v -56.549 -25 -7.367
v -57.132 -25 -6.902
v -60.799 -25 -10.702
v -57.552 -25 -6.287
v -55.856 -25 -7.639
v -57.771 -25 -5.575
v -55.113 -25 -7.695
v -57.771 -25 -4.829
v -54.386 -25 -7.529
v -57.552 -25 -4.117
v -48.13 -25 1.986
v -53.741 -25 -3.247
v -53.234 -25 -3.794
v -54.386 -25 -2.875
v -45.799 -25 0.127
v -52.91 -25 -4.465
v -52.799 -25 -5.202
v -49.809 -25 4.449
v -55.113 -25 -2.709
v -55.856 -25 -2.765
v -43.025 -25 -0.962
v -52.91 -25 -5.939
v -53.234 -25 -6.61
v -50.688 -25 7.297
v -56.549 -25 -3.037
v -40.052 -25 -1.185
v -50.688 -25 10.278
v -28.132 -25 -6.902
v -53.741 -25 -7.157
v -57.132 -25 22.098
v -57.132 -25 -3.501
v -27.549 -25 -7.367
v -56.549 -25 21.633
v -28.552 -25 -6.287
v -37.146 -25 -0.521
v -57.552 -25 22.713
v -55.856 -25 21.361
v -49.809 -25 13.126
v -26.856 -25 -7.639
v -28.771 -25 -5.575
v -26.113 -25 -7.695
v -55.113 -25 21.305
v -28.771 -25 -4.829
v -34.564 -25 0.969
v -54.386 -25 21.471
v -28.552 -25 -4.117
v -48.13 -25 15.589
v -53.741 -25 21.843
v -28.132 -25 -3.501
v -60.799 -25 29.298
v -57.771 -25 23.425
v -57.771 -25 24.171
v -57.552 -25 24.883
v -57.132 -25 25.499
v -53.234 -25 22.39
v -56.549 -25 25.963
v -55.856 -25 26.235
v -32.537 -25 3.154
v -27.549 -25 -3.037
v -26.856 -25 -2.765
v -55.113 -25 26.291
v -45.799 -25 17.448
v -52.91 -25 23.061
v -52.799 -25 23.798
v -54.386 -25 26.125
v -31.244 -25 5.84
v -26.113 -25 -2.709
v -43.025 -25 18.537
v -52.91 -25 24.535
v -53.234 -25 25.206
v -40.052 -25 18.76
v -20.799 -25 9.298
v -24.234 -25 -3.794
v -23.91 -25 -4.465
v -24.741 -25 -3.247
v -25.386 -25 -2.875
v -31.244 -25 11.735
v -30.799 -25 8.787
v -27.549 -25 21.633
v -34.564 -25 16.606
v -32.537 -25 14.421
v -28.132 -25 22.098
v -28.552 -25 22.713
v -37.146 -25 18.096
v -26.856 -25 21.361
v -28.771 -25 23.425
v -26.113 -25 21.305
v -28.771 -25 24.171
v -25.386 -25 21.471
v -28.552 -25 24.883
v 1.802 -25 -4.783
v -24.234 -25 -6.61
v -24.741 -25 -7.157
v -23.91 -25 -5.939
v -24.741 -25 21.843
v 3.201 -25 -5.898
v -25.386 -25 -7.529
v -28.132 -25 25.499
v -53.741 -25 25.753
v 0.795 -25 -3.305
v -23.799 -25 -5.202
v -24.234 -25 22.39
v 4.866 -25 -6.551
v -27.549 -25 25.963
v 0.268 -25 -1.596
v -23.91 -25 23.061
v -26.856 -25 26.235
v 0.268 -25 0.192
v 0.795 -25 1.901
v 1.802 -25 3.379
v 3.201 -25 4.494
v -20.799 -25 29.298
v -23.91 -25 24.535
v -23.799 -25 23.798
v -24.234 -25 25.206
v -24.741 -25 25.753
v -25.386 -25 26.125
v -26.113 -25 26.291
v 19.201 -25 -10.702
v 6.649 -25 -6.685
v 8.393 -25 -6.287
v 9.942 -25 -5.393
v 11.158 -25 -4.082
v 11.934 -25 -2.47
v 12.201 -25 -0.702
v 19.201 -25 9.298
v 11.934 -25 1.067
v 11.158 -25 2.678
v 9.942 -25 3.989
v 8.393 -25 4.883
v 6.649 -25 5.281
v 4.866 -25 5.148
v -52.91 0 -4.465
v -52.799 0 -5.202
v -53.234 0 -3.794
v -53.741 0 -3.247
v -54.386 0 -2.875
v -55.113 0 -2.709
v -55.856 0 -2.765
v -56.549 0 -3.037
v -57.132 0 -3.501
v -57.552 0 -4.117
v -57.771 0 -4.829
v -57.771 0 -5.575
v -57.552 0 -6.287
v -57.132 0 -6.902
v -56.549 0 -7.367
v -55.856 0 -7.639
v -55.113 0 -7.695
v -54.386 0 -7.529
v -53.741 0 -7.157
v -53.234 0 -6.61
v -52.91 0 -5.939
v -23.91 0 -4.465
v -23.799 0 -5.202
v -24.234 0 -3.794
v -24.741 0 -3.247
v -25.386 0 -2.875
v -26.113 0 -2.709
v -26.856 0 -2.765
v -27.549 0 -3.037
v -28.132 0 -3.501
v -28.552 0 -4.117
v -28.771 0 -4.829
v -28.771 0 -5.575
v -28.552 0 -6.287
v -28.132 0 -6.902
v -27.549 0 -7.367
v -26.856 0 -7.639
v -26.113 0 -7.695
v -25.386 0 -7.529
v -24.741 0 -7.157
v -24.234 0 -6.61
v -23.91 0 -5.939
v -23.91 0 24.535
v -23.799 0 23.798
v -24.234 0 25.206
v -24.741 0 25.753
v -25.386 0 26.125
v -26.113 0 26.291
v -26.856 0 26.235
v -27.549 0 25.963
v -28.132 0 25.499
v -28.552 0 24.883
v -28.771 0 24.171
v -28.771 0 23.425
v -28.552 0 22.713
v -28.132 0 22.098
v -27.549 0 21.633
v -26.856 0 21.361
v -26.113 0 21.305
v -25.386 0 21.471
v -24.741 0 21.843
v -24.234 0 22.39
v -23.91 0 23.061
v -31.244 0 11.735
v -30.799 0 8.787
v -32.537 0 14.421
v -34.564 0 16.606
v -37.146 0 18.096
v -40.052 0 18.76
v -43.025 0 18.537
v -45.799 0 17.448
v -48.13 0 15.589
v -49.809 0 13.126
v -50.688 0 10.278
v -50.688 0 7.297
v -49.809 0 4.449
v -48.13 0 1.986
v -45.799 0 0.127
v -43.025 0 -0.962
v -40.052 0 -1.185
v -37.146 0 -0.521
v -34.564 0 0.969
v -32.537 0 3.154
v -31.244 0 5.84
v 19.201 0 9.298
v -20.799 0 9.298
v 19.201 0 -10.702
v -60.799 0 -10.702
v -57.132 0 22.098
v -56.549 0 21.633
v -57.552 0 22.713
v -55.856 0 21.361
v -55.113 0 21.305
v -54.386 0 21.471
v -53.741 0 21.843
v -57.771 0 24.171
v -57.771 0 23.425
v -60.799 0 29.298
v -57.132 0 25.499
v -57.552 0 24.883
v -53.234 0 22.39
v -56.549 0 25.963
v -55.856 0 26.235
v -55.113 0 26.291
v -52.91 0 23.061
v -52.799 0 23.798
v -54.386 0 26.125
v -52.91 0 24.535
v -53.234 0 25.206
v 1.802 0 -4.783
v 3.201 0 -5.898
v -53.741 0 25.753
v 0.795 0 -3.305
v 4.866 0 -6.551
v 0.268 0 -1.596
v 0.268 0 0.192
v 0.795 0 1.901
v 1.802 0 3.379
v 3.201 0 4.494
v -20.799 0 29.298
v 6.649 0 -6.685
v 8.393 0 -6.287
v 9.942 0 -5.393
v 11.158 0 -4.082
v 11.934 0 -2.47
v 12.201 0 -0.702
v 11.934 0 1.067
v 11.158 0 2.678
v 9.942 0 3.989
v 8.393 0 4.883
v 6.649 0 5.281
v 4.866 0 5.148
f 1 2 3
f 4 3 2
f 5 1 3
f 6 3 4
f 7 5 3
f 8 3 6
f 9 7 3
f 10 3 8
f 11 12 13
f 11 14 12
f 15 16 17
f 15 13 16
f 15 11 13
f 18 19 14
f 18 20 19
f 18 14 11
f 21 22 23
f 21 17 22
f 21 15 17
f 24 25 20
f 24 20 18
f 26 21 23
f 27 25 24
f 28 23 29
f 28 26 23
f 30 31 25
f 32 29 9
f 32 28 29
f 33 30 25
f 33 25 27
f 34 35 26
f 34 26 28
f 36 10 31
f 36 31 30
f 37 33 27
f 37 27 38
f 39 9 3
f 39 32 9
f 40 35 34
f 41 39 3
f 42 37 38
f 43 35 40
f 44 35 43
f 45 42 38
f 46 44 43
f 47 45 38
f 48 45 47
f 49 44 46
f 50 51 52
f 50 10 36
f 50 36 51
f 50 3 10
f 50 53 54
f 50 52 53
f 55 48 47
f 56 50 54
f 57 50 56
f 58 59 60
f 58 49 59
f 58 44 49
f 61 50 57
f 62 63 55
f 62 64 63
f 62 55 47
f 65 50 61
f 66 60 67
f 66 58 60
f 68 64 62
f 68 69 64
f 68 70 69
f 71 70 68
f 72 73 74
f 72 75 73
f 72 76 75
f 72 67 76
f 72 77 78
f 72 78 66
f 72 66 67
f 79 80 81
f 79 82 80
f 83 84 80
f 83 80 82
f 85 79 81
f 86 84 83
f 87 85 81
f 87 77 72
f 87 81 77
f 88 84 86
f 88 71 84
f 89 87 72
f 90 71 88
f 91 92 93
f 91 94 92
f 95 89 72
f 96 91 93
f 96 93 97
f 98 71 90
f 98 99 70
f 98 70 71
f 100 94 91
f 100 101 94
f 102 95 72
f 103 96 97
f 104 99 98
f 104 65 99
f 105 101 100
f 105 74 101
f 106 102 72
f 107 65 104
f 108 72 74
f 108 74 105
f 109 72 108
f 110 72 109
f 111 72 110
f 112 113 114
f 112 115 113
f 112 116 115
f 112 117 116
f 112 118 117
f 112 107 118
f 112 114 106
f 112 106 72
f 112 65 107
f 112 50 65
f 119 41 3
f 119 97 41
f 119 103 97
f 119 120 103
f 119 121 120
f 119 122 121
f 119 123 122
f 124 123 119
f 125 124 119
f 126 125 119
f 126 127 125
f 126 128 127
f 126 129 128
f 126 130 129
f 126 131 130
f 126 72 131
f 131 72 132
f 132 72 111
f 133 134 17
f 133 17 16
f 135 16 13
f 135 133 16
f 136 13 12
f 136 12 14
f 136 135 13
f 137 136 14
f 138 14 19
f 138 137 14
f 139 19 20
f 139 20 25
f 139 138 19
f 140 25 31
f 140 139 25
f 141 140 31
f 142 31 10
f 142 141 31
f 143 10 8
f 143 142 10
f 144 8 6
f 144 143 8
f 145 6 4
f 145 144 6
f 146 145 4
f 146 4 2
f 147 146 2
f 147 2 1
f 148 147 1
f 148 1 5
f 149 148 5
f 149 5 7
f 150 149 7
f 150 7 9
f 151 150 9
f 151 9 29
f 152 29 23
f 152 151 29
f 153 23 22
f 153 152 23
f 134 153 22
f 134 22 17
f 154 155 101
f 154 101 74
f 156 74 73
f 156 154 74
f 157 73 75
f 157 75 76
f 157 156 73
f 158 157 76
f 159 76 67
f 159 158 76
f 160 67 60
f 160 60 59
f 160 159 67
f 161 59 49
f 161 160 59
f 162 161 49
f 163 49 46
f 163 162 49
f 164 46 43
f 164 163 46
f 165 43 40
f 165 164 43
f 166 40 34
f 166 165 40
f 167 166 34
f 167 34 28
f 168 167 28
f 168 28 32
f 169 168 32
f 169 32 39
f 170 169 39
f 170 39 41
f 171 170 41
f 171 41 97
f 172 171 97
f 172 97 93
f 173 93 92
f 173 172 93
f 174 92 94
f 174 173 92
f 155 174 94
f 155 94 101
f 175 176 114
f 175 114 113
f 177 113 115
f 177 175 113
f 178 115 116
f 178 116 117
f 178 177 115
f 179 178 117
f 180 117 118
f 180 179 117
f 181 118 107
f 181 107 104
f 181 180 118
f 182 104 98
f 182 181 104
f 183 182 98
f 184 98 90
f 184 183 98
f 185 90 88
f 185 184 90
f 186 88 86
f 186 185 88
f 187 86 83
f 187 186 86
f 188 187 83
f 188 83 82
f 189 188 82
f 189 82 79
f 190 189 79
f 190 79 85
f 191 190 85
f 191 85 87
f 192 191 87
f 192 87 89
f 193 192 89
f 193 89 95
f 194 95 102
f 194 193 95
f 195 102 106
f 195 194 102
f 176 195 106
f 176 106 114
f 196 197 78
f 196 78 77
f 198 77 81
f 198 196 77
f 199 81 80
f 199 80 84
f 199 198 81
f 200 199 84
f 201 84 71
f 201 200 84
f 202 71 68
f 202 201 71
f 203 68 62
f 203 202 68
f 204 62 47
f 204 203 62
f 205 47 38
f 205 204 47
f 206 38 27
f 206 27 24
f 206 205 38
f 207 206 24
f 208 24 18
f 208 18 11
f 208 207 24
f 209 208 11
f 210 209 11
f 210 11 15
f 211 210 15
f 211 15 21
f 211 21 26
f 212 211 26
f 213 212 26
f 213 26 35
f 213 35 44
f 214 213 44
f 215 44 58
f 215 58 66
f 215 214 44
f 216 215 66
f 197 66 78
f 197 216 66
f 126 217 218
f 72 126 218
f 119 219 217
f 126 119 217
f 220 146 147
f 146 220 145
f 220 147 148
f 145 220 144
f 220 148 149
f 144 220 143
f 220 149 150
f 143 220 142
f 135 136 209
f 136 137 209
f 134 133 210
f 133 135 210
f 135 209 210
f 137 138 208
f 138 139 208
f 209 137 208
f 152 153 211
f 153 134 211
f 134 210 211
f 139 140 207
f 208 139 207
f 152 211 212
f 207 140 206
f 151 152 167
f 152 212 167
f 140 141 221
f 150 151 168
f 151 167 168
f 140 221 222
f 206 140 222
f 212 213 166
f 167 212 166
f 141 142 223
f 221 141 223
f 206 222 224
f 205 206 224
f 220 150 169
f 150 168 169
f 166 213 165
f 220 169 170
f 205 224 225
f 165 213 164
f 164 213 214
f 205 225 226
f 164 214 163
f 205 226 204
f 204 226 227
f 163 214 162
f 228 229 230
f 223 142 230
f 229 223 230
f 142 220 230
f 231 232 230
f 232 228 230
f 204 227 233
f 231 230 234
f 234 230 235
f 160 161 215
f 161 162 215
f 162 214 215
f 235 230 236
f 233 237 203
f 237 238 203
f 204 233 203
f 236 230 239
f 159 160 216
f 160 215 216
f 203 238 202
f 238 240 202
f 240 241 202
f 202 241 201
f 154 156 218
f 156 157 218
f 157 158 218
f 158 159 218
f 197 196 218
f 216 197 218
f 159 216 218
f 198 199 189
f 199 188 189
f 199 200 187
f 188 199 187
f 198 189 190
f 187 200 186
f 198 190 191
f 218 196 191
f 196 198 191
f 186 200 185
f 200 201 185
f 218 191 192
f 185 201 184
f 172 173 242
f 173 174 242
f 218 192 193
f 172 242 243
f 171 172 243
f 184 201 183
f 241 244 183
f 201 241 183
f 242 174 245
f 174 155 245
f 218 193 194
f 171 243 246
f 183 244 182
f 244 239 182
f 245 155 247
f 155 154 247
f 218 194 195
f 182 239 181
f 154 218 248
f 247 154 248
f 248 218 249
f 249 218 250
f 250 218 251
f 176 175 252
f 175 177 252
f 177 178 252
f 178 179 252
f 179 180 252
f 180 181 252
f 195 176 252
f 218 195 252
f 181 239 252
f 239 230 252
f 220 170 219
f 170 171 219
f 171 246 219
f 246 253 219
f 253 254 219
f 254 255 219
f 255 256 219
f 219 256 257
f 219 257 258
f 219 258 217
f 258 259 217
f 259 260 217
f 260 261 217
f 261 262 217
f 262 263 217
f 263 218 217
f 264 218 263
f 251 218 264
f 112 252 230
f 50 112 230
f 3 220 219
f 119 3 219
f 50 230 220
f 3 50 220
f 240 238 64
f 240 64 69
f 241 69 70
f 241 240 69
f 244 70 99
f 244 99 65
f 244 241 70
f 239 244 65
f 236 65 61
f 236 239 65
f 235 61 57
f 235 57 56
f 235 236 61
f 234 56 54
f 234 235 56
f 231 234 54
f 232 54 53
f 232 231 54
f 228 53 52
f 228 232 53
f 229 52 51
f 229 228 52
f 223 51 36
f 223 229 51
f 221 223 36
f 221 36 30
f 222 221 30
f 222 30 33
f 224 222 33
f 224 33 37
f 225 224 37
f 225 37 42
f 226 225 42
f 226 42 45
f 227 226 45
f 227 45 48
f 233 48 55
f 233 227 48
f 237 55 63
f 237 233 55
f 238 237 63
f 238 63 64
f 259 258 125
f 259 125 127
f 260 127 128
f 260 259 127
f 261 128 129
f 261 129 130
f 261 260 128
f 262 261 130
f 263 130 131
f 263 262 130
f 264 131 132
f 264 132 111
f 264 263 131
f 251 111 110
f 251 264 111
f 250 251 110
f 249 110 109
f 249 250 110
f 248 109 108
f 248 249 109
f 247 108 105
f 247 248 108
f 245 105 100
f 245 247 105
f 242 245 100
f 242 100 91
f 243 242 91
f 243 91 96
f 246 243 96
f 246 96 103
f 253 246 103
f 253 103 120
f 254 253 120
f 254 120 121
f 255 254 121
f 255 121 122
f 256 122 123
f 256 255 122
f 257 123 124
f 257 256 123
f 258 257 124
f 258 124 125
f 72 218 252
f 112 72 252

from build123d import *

# Parameters (mm, degrees)
F0_R     = 2.5
F0_R_2   = 10
F0_R_3   = 6
F1_DEPTH = 25


with BuildPart() as f1:
    # F0 (on Front) → F1 (new body)
    with BuildSketch(Plane.XZ):
        Polygon((-20.799367, 29.298078), (-60.799367, 29.298078), (-60.799367, -10.701922), (19.200633, -10.701922), (19.200633, 9.298078), (-20.799367, 9.298078), align=None)
        with Locations((-55.299367, -5.201922)):
            Circle(F0_R, mode=Mode.SUBTRACT)
        with Locations((-26.299367, -5.201922)):
            Circle(F0_R, mode=Mode.SUBTRACT)
        with Locations((-40.799367, 8.787482)):
            Circle(F0_R_2, mode=Mode.SUBTRACT)
        with Locations((6.200633, -0.701922)):
            Circle(F0_R_3, mode=Mode.SUBTRACT)
        with Locations((-55.299367, 23.798078)):
            Circle(F0_R, mode=Mode.SUBTRACT)
        with Locations((-26.299367, 23.798078)):
            Circle(F0_R, mode=Mode.SUBTRACT)
    extrude(amount=F1_DEPTH)


solid = f1.part
